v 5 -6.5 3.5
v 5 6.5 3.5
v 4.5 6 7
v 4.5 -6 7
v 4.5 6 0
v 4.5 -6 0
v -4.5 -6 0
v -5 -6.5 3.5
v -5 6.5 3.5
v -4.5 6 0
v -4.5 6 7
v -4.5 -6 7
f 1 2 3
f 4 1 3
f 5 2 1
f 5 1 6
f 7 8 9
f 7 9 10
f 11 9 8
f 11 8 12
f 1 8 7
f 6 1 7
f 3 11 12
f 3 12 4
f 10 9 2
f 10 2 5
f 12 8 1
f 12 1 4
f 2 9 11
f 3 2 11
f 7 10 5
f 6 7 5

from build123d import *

# Parameters (mm, degrees)
F0_W        = 10
F0_H        = 13
F1_DEPTH    = 7
F2_T1_DEPTH = 31.1932339785
F2_T3_DEPTH = 28.1932339785


# Not quite as in the source:
# - a fillet or chamfer that OpenCascade refuses, or shapes differently, is made with other operations: its cross-section is extruded or revolved along the edge and cut away or added
# - a feature of the source that left no trace in its solid (it failed there, or was rolled back) is left out


with BuildPart() as f1:
    # F0 (on Top) → F1 (new body)
    with BuildSketch(Plane.XY):
        Rectangle(F0_W, F0_H)
    extrude(amount=F1_DEPTH)

    # F2: chamfer of 0.5 x 3.5 on 8 edges, made by hand

    # F2_s2 → F2_t1 (cut)
    with BuildSketch(Plane.XZ.offset(-15.5966169892)):
        Polygon((-5, 3.5), (-4.5, 7), (-5, 7), align=None)
        Polygon((5, 3.5), (4.5, 7), (5, 7), align=None)
        Polygon((-5, 3.5), (-4.5, 0), (-5, 0), align=None)
        Polygon((5, 3.5), (4.5, 0), (5, 0), align=None)
    extrude(amount=F2_T1_DEPTH, mode=Mode.SUBTRACT)

    # F2_s4 → F2_t3 (cut)
    with BuildSketch(Plane.YZ.offset(-14.0966169892)):
        Polygon((-6.5, 3.5), (-6, 7), (-6.5, 7), align=None)
        Polygon((6.5, 3.5), (6, 7), (6.5, 7), align=None)
        Polygon((-6.5, 3.5), (-6, 0), (-6.5, 0), align=None)
        Polygon((6.5, 3.5), (6, 0), (6.5, 0), align=None)
    extrude(amount=F2_T3_DEPTH, mode=Mode.SUBTRACT)


solid = f1.part
